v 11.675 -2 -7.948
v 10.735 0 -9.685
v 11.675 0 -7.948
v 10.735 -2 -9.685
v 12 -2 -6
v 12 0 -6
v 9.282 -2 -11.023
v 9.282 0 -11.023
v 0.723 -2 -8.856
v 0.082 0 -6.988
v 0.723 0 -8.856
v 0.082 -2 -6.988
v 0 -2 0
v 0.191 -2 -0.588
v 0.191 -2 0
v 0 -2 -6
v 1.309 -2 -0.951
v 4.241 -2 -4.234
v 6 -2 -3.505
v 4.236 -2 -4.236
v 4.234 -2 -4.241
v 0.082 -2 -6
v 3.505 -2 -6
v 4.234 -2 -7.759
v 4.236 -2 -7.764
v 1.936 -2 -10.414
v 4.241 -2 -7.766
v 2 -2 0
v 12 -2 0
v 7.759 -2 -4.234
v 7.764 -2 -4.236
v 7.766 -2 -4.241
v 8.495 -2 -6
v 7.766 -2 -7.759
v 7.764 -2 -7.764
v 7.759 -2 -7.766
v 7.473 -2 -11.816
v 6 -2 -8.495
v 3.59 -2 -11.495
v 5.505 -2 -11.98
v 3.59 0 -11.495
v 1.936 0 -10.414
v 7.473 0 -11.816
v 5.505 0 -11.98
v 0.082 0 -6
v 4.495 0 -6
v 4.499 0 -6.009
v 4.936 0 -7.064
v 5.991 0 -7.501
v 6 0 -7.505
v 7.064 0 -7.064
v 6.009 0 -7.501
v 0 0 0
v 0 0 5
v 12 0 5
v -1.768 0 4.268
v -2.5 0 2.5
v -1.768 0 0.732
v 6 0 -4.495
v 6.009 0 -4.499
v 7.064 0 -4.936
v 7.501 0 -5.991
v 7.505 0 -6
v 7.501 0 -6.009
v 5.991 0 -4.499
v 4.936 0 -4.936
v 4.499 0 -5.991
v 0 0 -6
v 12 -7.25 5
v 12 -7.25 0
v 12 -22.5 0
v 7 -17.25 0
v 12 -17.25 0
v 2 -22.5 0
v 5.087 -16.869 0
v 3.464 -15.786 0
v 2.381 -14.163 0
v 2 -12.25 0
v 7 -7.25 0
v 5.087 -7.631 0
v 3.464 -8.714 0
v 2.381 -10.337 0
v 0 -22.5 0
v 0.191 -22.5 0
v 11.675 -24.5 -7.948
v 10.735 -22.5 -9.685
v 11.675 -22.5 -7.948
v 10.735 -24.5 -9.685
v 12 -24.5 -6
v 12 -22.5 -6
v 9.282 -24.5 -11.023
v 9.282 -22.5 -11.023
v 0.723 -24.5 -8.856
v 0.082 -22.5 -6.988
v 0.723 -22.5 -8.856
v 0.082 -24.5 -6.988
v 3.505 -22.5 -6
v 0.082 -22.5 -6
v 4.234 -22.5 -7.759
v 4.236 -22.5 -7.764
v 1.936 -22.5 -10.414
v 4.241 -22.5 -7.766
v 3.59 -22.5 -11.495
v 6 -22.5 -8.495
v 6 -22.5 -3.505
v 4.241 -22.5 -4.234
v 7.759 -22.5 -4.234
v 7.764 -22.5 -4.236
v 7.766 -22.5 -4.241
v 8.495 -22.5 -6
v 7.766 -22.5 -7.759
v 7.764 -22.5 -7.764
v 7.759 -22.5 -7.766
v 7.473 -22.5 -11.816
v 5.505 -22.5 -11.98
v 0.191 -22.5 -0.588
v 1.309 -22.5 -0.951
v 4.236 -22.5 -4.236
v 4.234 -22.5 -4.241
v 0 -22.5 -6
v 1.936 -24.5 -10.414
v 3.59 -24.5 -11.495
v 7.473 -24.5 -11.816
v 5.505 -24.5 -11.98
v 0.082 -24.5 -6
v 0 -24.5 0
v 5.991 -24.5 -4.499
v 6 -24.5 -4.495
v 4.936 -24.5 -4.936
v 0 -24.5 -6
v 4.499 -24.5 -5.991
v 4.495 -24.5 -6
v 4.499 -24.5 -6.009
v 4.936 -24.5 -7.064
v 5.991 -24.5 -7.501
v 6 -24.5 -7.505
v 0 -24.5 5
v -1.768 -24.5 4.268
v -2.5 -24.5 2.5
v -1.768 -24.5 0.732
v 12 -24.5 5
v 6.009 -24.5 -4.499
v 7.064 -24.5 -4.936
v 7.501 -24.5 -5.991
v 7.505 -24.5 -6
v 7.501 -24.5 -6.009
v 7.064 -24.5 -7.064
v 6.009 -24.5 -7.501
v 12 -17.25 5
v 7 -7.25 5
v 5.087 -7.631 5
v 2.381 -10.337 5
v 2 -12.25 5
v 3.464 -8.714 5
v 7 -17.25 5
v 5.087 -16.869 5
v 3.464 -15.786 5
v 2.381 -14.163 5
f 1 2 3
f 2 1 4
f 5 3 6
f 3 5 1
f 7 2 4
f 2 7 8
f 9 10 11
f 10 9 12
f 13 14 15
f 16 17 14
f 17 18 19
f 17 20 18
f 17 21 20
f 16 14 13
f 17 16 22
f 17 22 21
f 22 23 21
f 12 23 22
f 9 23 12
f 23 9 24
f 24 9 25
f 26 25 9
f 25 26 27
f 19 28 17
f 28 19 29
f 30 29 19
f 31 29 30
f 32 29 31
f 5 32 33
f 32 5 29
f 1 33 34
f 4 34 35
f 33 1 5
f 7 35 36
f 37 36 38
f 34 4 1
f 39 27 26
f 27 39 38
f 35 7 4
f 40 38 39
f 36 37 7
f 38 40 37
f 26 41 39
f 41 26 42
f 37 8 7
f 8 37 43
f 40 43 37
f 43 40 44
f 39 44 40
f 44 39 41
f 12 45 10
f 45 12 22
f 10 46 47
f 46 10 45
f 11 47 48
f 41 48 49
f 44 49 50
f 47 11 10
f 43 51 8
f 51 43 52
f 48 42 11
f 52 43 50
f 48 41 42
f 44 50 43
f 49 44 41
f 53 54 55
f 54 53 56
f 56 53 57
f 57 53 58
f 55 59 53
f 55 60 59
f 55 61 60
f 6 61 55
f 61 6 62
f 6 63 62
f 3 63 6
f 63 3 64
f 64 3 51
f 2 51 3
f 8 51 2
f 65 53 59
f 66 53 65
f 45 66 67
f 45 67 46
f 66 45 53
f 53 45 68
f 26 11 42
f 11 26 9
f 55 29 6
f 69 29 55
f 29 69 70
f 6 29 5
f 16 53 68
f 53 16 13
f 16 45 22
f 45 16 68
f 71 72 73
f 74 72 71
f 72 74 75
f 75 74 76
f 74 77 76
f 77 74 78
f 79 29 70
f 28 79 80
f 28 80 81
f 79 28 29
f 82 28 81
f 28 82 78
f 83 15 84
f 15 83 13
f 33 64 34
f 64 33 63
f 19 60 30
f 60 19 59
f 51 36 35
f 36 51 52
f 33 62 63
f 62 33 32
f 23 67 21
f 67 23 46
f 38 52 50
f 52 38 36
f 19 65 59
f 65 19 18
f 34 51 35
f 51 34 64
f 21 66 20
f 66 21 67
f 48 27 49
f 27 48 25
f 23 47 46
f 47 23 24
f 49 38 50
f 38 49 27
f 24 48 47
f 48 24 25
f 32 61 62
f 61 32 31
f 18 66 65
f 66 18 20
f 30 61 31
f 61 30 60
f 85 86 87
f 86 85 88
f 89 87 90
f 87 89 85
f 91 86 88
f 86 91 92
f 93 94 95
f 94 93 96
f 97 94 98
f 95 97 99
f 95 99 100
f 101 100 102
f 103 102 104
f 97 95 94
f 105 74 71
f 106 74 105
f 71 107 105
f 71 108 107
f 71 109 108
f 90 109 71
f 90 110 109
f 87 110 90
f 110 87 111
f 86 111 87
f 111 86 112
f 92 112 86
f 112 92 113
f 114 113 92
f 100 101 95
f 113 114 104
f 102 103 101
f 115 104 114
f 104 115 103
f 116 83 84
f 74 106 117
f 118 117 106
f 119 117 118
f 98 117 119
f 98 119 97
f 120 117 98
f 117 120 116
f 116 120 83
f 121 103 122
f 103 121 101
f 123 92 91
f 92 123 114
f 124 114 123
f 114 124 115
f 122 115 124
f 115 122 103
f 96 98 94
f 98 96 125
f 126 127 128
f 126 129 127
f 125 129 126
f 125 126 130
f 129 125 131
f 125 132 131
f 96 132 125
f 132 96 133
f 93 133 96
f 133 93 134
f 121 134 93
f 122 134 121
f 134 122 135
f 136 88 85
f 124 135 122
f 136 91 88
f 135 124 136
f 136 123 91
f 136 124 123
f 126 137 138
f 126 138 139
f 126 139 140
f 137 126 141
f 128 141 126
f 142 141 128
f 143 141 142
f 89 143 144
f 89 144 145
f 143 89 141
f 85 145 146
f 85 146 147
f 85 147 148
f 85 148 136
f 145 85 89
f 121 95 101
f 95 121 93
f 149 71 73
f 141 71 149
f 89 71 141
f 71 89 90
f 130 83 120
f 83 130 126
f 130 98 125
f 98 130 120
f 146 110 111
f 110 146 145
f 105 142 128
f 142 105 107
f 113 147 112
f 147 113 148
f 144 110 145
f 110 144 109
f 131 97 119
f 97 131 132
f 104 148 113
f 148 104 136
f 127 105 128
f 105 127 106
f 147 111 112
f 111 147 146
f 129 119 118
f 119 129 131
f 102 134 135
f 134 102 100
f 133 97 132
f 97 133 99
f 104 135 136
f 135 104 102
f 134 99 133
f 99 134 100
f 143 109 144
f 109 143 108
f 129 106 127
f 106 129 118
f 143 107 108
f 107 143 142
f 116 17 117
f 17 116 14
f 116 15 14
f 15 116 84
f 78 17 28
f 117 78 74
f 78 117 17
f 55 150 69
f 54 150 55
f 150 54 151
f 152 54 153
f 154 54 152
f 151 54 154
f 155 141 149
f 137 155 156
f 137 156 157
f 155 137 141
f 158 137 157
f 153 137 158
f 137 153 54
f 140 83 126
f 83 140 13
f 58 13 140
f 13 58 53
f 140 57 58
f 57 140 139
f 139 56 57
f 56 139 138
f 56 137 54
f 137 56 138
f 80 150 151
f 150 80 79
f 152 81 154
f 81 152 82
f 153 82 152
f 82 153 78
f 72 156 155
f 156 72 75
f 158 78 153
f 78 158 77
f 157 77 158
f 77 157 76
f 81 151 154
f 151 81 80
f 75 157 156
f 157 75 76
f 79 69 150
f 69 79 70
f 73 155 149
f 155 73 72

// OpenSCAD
chainMount();

module chainMount() {
  translate([6,-22.5,-6]) {
    translate([0,20.5,0]) rotate([-90,0,0]) chainClip();
    mirror([0,1,0]) rotate([-90,0,0]) chainClip();
    translate([-5,20.5,6]) rotate([90,0,0]) cylinder(r=1,h=20.5);
  }
  translate([0,-24.5,0]) difference() {
    union() {
      cube([12,24.5,5]);
      translate([0,0,2.5]) rotate([-90,0,0]) cylinder(r=2.5,h=24.5);
    }
    translate([7,12.25,-1]) cylinder(r=5,h=7);
    translate([7,7.25,-1]) cube([6,10,7]);
  }
}

module chainClip() {
  difference() {
    union() { 
      cylinder(r=6,h=2);
      translate([-6,-6,0]) cube([12,6,2]);
    }
    translate([0,0,-0.01]) cylinder(r1=2.5,r2=1.5,h=2.02);
  }
}
